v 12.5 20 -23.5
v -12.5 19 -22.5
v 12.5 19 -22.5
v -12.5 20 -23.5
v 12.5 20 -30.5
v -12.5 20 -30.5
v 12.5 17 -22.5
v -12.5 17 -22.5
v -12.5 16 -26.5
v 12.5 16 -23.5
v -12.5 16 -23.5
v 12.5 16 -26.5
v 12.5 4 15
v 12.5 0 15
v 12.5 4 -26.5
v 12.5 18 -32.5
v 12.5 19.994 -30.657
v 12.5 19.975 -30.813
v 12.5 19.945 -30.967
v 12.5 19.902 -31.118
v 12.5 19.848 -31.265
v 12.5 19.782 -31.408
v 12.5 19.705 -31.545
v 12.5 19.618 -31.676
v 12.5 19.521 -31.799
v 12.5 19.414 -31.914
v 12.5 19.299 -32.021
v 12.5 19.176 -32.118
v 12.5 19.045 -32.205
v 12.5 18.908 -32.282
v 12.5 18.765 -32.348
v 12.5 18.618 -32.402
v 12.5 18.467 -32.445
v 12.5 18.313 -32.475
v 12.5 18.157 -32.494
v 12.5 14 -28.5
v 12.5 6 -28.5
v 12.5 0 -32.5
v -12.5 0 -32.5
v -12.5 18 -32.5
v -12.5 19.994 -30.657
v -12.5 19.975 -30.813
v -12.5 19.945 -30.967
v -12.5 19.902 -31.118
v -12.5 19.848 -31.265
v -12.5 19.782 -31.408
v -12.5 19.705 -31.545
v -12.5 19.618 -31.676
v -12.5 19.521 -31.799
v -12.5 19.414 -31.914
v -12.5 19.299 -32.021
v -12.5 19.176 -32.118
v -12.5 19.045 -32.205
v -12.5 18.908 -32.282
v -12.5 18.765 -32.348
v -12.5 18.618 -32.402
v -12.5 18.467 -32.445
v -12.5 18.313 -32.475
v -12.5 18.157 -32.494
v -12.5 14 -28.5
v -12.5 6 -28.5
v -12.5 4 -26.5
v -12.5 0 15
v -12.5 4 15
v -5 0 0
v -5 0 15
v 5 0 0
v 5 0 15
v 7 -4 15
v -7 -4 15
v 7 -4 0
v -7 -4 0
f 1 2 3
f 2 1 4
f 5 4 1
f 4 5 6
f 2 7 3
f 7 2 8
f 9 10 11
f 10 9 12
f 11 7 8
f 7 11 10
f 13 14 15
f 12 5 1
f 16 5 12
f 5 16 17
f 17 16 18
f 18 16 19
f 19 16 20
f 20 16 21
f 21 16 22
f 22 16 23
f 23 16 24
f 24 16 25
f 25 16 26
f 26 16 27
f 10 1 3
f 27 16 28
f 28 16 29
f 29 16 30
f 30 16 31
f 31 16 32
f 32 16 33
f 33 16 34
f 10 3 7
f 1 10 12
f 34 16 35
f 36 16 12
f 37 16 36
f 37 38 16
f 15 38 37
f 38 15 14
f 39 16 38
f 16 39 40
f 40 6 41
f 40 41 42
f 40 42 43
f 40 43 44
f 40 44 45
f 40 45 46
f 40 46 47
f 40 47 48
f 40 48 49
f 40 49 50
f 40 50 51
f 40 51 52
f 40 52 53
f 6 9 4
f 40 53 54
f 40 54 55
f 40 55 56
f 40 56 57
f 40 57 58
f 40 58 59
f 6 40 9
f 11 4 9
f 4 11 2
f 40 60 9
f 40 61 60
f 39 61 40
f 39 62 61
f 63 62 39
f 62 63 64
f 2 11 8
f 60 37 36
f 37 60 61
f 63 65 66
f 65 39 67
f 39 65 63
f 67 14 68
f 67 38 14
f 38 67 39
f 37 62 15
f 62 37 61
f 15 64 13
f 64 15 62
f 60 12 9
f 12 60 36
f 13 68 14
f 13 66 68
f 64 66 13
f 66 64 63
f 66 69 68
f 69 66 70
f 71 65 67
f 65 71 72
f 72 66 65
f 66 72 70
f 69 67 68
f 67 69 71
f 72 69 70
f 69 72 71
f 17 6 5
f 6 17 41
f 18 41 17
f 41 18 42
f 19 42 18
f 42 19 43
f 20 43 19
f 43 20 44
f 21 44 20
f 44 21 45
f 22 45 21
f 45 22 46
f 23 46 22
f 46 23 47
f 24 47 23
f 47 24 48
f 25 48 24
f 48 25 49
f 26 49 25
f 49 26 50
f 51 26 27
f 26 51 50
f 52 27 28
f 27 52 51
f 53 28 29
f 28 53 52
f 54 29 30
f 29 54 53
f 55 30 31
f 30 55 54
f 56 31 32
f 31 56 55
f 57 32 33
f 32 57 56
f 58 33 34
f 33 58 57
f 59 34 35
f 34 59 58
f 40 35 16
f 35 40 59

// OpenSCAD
// file: config.scad
// Cupholder Configuration
// All dimensions in millimeters
// Use OpenSCAD's Customizer (View > Customizer) to adjust parameters

/* [Cup Holder] */
cup_diameter = 70;           // [50:1:100] Inner diameter of the ring
cup_holder_height = 20;      // [10:1:40] Height of the ring
cup_wall_thickness = 2;      // [1:0.5:5] Wall thickness of the ring

/* [Posts and Bar] */
post_height = 40;            // [20:1:60] Height of vertical posts
post_thickness = 2;          // [1:0.5:5] Thickness of vertical posts

/* [Hook] */
hook_arm_height = 65;        // [40:1:100] Height of vertical arm above ring
hook_tip_length = 30;        // [15:1:50] Horizontal length of hook tip
hook_tip_depth = 20;         // [10:1:40] How far the hook tip curls down
hook_width = 25;             // [15:1:40] Width of the hook arm
hook_thickness = 2;          // [1:0.5:5] Thickness of the hook arm

/* [Hook Down] */
hook_down_arm_height = 32.5;   // [20:0.5:50] Height of vertical arm
hook_down_tip_length = 20;     // [8:1:30] Horizontal length of hook tip
hook_down_tip_depth = 10;      // [5:1:25] Height of upward lip
hook_down_thickness = 4;       // [2:0.5:8] Thickness of hook arm
hook_down_tip_chamfer = 1;     // [0:0.5:4] Tip chamfer depth (each side)
hook_down_corner_chamfer = 2;  // [0:0.5:4] Inside corner reinforcement size

/* [Dovetail Joint] */
dovetail_width_base = 10;    // [6:1:15] Width at narrow end (top)
dovetail_width_top = 14;     // [10:1:20] Width at wide end (bottom)
dovetail_height = 15;        // [10:1:25] Height of dovetail
dovetail_depth = 4;          // [2:0.5:8] Depth of dovetail protrusion
dovetail_tolerance = 0.4;    // [0.1:0.1:1] Gap for fit

/* [Print Settings] */
nozzle_width = 0.4;          // [0.2:0.1:0.8] Nozzle diameter
layer_height = 0.2;          // [0.1:0.05:0.4] Layer height

/* [Hidden] */
// Calculated values
hook_total_length = hook_arm_height + cup_holder_height + post_height;
mounting_block_thickness = max(post_thickness, cup_wall_thickness) + dovetail_depth;

// Support toggle (set false for assembly view)
$show_center_support = is_undef($show_center_support) ? true : $show_center_support;

// Rendering quality
$fn = 80;
// main file
// Hook Down Part
// Downward-extending hook with halved lengths, doubled thickness, and chamfered tip

include <config.scad>

// Main hook_down module
module hook_down() {
    r = hook_down_corner_chamfer;
    total_height = hook_down_arm_height;
    lip_y = hook_down_tip_length - hook_down_thickness;

    difference() {
        union() {
            vertical_arm_down();
            hook_tip_down();
            dovetail_protrusion_down();
        }

        // Fillet at outer corner: shelf bottom meets lip outer face
        if (r > 0) {
            translate([-hook_width/2 - 0.1, lip_y + hook_down_thickness - r, -total_height])
            rotate([90, 0, 90])
            linear_extrude(height = hook_width + 0.2)
            difference() {
                square([r, r]);
                translate([0, r]) circle(r = r);
            }
        }
    }
}

// Vertical arm - extends downward from dovetail top
module vertical_arm_down() {
    total_height = hook_down_arm_height;

    translate([-hook_width/2, 0, -total_height])
    cube([hook_width, hook_down_thickness, total_height + dovetail_height]);
}

// L-shaped hook tip (mirrored) - shelf at bottom, lip extends upward
module hook_tip_down() {
    total_height = hook_down_arm_height;
    c = hook_down_corner_chamfer;
    tc = hook_down_tip_chamfer;
    lip_y = hook_down_tip_length - hook_down_thickness;
    shelf_top_z = -total_height + hook_down_thickness;
    lip_top_z = -total_height + hook_down_tip_depth;

    // Horizontal shelf
    translate([-hook_width/2, 0, -total_height])
    cube([hook_width, hook_down_tip_length, hook_down_thickness]);

    // Upward lip with tip chamfers on both long edges
    difference() {
        translate([-hook_width/2, lip_y, -total_height])
        cube([hook_width, hook_down_thickness, hook_down_tip_depth]);

        if (tc > 0) {
            // Tip chamfer - front face (Y+ edge at top of lip)
            translate([-hook_width/2 - 0.1, lip_y + hook_down_thickness, lip_top_z])
            rotate([90, 0, 90])
            linear_extrude(height = hook_width + 0.2)
            polygon([[0, 0], [-tc, 0], [0, -tc]]);

            // Tip chamfer - back face (Y- edge at top of lip)
            translate([-hook_width/2 - 0.1, lip_y, lip_top_z])
            rotate([90, 0, 90])
            linear_extrude(height = hook_width + 0.2)
            polygon([[0, 0], [tc, 0], [0, -tc]]);
        }
    }

    // Inside corner chamfer: arm-to-shelf (additive)
    if (c > 0) {
        translate([-hook_width/2, hook_down_thickness, shelf_top_z])
        rotate([90, 0, 90])
        linear_extrude(height = hook_width)
        polygon([[0, 0], [c, 0], [0, c]]);
    }

    // Inside corner chamfer: shelf-to-lip (additive)
    if (c > 0) {
        translate([-hook_width/2, lip_y, shelf_top_z])
        rotate([90, 0, 90])
        linear_extrude(height = hook_width)
        polygon([[0, 0], [-c, 0], [0, c]]);
    }
}

// Dovetail protrusion (male) - identical interface to hook.scad
module dovetail_protrusion_down() {
    rotate([0, 0, 180])
    dovetail_positive_down();
}

// Dovetail positive shape
module dovetail_positive_down() {
    linear_extrude(height = dovetail_height)
    polygon(points = [
        [-dovetail_width_base/2, 0],
        [-dovetail_width_top/2, dovetail_depth],
        [dovetail_width_top/2, dovetail_depth],
        [dovetail_width_base/2, 0]
    ]);
}

// Render the hook
hook_down();
